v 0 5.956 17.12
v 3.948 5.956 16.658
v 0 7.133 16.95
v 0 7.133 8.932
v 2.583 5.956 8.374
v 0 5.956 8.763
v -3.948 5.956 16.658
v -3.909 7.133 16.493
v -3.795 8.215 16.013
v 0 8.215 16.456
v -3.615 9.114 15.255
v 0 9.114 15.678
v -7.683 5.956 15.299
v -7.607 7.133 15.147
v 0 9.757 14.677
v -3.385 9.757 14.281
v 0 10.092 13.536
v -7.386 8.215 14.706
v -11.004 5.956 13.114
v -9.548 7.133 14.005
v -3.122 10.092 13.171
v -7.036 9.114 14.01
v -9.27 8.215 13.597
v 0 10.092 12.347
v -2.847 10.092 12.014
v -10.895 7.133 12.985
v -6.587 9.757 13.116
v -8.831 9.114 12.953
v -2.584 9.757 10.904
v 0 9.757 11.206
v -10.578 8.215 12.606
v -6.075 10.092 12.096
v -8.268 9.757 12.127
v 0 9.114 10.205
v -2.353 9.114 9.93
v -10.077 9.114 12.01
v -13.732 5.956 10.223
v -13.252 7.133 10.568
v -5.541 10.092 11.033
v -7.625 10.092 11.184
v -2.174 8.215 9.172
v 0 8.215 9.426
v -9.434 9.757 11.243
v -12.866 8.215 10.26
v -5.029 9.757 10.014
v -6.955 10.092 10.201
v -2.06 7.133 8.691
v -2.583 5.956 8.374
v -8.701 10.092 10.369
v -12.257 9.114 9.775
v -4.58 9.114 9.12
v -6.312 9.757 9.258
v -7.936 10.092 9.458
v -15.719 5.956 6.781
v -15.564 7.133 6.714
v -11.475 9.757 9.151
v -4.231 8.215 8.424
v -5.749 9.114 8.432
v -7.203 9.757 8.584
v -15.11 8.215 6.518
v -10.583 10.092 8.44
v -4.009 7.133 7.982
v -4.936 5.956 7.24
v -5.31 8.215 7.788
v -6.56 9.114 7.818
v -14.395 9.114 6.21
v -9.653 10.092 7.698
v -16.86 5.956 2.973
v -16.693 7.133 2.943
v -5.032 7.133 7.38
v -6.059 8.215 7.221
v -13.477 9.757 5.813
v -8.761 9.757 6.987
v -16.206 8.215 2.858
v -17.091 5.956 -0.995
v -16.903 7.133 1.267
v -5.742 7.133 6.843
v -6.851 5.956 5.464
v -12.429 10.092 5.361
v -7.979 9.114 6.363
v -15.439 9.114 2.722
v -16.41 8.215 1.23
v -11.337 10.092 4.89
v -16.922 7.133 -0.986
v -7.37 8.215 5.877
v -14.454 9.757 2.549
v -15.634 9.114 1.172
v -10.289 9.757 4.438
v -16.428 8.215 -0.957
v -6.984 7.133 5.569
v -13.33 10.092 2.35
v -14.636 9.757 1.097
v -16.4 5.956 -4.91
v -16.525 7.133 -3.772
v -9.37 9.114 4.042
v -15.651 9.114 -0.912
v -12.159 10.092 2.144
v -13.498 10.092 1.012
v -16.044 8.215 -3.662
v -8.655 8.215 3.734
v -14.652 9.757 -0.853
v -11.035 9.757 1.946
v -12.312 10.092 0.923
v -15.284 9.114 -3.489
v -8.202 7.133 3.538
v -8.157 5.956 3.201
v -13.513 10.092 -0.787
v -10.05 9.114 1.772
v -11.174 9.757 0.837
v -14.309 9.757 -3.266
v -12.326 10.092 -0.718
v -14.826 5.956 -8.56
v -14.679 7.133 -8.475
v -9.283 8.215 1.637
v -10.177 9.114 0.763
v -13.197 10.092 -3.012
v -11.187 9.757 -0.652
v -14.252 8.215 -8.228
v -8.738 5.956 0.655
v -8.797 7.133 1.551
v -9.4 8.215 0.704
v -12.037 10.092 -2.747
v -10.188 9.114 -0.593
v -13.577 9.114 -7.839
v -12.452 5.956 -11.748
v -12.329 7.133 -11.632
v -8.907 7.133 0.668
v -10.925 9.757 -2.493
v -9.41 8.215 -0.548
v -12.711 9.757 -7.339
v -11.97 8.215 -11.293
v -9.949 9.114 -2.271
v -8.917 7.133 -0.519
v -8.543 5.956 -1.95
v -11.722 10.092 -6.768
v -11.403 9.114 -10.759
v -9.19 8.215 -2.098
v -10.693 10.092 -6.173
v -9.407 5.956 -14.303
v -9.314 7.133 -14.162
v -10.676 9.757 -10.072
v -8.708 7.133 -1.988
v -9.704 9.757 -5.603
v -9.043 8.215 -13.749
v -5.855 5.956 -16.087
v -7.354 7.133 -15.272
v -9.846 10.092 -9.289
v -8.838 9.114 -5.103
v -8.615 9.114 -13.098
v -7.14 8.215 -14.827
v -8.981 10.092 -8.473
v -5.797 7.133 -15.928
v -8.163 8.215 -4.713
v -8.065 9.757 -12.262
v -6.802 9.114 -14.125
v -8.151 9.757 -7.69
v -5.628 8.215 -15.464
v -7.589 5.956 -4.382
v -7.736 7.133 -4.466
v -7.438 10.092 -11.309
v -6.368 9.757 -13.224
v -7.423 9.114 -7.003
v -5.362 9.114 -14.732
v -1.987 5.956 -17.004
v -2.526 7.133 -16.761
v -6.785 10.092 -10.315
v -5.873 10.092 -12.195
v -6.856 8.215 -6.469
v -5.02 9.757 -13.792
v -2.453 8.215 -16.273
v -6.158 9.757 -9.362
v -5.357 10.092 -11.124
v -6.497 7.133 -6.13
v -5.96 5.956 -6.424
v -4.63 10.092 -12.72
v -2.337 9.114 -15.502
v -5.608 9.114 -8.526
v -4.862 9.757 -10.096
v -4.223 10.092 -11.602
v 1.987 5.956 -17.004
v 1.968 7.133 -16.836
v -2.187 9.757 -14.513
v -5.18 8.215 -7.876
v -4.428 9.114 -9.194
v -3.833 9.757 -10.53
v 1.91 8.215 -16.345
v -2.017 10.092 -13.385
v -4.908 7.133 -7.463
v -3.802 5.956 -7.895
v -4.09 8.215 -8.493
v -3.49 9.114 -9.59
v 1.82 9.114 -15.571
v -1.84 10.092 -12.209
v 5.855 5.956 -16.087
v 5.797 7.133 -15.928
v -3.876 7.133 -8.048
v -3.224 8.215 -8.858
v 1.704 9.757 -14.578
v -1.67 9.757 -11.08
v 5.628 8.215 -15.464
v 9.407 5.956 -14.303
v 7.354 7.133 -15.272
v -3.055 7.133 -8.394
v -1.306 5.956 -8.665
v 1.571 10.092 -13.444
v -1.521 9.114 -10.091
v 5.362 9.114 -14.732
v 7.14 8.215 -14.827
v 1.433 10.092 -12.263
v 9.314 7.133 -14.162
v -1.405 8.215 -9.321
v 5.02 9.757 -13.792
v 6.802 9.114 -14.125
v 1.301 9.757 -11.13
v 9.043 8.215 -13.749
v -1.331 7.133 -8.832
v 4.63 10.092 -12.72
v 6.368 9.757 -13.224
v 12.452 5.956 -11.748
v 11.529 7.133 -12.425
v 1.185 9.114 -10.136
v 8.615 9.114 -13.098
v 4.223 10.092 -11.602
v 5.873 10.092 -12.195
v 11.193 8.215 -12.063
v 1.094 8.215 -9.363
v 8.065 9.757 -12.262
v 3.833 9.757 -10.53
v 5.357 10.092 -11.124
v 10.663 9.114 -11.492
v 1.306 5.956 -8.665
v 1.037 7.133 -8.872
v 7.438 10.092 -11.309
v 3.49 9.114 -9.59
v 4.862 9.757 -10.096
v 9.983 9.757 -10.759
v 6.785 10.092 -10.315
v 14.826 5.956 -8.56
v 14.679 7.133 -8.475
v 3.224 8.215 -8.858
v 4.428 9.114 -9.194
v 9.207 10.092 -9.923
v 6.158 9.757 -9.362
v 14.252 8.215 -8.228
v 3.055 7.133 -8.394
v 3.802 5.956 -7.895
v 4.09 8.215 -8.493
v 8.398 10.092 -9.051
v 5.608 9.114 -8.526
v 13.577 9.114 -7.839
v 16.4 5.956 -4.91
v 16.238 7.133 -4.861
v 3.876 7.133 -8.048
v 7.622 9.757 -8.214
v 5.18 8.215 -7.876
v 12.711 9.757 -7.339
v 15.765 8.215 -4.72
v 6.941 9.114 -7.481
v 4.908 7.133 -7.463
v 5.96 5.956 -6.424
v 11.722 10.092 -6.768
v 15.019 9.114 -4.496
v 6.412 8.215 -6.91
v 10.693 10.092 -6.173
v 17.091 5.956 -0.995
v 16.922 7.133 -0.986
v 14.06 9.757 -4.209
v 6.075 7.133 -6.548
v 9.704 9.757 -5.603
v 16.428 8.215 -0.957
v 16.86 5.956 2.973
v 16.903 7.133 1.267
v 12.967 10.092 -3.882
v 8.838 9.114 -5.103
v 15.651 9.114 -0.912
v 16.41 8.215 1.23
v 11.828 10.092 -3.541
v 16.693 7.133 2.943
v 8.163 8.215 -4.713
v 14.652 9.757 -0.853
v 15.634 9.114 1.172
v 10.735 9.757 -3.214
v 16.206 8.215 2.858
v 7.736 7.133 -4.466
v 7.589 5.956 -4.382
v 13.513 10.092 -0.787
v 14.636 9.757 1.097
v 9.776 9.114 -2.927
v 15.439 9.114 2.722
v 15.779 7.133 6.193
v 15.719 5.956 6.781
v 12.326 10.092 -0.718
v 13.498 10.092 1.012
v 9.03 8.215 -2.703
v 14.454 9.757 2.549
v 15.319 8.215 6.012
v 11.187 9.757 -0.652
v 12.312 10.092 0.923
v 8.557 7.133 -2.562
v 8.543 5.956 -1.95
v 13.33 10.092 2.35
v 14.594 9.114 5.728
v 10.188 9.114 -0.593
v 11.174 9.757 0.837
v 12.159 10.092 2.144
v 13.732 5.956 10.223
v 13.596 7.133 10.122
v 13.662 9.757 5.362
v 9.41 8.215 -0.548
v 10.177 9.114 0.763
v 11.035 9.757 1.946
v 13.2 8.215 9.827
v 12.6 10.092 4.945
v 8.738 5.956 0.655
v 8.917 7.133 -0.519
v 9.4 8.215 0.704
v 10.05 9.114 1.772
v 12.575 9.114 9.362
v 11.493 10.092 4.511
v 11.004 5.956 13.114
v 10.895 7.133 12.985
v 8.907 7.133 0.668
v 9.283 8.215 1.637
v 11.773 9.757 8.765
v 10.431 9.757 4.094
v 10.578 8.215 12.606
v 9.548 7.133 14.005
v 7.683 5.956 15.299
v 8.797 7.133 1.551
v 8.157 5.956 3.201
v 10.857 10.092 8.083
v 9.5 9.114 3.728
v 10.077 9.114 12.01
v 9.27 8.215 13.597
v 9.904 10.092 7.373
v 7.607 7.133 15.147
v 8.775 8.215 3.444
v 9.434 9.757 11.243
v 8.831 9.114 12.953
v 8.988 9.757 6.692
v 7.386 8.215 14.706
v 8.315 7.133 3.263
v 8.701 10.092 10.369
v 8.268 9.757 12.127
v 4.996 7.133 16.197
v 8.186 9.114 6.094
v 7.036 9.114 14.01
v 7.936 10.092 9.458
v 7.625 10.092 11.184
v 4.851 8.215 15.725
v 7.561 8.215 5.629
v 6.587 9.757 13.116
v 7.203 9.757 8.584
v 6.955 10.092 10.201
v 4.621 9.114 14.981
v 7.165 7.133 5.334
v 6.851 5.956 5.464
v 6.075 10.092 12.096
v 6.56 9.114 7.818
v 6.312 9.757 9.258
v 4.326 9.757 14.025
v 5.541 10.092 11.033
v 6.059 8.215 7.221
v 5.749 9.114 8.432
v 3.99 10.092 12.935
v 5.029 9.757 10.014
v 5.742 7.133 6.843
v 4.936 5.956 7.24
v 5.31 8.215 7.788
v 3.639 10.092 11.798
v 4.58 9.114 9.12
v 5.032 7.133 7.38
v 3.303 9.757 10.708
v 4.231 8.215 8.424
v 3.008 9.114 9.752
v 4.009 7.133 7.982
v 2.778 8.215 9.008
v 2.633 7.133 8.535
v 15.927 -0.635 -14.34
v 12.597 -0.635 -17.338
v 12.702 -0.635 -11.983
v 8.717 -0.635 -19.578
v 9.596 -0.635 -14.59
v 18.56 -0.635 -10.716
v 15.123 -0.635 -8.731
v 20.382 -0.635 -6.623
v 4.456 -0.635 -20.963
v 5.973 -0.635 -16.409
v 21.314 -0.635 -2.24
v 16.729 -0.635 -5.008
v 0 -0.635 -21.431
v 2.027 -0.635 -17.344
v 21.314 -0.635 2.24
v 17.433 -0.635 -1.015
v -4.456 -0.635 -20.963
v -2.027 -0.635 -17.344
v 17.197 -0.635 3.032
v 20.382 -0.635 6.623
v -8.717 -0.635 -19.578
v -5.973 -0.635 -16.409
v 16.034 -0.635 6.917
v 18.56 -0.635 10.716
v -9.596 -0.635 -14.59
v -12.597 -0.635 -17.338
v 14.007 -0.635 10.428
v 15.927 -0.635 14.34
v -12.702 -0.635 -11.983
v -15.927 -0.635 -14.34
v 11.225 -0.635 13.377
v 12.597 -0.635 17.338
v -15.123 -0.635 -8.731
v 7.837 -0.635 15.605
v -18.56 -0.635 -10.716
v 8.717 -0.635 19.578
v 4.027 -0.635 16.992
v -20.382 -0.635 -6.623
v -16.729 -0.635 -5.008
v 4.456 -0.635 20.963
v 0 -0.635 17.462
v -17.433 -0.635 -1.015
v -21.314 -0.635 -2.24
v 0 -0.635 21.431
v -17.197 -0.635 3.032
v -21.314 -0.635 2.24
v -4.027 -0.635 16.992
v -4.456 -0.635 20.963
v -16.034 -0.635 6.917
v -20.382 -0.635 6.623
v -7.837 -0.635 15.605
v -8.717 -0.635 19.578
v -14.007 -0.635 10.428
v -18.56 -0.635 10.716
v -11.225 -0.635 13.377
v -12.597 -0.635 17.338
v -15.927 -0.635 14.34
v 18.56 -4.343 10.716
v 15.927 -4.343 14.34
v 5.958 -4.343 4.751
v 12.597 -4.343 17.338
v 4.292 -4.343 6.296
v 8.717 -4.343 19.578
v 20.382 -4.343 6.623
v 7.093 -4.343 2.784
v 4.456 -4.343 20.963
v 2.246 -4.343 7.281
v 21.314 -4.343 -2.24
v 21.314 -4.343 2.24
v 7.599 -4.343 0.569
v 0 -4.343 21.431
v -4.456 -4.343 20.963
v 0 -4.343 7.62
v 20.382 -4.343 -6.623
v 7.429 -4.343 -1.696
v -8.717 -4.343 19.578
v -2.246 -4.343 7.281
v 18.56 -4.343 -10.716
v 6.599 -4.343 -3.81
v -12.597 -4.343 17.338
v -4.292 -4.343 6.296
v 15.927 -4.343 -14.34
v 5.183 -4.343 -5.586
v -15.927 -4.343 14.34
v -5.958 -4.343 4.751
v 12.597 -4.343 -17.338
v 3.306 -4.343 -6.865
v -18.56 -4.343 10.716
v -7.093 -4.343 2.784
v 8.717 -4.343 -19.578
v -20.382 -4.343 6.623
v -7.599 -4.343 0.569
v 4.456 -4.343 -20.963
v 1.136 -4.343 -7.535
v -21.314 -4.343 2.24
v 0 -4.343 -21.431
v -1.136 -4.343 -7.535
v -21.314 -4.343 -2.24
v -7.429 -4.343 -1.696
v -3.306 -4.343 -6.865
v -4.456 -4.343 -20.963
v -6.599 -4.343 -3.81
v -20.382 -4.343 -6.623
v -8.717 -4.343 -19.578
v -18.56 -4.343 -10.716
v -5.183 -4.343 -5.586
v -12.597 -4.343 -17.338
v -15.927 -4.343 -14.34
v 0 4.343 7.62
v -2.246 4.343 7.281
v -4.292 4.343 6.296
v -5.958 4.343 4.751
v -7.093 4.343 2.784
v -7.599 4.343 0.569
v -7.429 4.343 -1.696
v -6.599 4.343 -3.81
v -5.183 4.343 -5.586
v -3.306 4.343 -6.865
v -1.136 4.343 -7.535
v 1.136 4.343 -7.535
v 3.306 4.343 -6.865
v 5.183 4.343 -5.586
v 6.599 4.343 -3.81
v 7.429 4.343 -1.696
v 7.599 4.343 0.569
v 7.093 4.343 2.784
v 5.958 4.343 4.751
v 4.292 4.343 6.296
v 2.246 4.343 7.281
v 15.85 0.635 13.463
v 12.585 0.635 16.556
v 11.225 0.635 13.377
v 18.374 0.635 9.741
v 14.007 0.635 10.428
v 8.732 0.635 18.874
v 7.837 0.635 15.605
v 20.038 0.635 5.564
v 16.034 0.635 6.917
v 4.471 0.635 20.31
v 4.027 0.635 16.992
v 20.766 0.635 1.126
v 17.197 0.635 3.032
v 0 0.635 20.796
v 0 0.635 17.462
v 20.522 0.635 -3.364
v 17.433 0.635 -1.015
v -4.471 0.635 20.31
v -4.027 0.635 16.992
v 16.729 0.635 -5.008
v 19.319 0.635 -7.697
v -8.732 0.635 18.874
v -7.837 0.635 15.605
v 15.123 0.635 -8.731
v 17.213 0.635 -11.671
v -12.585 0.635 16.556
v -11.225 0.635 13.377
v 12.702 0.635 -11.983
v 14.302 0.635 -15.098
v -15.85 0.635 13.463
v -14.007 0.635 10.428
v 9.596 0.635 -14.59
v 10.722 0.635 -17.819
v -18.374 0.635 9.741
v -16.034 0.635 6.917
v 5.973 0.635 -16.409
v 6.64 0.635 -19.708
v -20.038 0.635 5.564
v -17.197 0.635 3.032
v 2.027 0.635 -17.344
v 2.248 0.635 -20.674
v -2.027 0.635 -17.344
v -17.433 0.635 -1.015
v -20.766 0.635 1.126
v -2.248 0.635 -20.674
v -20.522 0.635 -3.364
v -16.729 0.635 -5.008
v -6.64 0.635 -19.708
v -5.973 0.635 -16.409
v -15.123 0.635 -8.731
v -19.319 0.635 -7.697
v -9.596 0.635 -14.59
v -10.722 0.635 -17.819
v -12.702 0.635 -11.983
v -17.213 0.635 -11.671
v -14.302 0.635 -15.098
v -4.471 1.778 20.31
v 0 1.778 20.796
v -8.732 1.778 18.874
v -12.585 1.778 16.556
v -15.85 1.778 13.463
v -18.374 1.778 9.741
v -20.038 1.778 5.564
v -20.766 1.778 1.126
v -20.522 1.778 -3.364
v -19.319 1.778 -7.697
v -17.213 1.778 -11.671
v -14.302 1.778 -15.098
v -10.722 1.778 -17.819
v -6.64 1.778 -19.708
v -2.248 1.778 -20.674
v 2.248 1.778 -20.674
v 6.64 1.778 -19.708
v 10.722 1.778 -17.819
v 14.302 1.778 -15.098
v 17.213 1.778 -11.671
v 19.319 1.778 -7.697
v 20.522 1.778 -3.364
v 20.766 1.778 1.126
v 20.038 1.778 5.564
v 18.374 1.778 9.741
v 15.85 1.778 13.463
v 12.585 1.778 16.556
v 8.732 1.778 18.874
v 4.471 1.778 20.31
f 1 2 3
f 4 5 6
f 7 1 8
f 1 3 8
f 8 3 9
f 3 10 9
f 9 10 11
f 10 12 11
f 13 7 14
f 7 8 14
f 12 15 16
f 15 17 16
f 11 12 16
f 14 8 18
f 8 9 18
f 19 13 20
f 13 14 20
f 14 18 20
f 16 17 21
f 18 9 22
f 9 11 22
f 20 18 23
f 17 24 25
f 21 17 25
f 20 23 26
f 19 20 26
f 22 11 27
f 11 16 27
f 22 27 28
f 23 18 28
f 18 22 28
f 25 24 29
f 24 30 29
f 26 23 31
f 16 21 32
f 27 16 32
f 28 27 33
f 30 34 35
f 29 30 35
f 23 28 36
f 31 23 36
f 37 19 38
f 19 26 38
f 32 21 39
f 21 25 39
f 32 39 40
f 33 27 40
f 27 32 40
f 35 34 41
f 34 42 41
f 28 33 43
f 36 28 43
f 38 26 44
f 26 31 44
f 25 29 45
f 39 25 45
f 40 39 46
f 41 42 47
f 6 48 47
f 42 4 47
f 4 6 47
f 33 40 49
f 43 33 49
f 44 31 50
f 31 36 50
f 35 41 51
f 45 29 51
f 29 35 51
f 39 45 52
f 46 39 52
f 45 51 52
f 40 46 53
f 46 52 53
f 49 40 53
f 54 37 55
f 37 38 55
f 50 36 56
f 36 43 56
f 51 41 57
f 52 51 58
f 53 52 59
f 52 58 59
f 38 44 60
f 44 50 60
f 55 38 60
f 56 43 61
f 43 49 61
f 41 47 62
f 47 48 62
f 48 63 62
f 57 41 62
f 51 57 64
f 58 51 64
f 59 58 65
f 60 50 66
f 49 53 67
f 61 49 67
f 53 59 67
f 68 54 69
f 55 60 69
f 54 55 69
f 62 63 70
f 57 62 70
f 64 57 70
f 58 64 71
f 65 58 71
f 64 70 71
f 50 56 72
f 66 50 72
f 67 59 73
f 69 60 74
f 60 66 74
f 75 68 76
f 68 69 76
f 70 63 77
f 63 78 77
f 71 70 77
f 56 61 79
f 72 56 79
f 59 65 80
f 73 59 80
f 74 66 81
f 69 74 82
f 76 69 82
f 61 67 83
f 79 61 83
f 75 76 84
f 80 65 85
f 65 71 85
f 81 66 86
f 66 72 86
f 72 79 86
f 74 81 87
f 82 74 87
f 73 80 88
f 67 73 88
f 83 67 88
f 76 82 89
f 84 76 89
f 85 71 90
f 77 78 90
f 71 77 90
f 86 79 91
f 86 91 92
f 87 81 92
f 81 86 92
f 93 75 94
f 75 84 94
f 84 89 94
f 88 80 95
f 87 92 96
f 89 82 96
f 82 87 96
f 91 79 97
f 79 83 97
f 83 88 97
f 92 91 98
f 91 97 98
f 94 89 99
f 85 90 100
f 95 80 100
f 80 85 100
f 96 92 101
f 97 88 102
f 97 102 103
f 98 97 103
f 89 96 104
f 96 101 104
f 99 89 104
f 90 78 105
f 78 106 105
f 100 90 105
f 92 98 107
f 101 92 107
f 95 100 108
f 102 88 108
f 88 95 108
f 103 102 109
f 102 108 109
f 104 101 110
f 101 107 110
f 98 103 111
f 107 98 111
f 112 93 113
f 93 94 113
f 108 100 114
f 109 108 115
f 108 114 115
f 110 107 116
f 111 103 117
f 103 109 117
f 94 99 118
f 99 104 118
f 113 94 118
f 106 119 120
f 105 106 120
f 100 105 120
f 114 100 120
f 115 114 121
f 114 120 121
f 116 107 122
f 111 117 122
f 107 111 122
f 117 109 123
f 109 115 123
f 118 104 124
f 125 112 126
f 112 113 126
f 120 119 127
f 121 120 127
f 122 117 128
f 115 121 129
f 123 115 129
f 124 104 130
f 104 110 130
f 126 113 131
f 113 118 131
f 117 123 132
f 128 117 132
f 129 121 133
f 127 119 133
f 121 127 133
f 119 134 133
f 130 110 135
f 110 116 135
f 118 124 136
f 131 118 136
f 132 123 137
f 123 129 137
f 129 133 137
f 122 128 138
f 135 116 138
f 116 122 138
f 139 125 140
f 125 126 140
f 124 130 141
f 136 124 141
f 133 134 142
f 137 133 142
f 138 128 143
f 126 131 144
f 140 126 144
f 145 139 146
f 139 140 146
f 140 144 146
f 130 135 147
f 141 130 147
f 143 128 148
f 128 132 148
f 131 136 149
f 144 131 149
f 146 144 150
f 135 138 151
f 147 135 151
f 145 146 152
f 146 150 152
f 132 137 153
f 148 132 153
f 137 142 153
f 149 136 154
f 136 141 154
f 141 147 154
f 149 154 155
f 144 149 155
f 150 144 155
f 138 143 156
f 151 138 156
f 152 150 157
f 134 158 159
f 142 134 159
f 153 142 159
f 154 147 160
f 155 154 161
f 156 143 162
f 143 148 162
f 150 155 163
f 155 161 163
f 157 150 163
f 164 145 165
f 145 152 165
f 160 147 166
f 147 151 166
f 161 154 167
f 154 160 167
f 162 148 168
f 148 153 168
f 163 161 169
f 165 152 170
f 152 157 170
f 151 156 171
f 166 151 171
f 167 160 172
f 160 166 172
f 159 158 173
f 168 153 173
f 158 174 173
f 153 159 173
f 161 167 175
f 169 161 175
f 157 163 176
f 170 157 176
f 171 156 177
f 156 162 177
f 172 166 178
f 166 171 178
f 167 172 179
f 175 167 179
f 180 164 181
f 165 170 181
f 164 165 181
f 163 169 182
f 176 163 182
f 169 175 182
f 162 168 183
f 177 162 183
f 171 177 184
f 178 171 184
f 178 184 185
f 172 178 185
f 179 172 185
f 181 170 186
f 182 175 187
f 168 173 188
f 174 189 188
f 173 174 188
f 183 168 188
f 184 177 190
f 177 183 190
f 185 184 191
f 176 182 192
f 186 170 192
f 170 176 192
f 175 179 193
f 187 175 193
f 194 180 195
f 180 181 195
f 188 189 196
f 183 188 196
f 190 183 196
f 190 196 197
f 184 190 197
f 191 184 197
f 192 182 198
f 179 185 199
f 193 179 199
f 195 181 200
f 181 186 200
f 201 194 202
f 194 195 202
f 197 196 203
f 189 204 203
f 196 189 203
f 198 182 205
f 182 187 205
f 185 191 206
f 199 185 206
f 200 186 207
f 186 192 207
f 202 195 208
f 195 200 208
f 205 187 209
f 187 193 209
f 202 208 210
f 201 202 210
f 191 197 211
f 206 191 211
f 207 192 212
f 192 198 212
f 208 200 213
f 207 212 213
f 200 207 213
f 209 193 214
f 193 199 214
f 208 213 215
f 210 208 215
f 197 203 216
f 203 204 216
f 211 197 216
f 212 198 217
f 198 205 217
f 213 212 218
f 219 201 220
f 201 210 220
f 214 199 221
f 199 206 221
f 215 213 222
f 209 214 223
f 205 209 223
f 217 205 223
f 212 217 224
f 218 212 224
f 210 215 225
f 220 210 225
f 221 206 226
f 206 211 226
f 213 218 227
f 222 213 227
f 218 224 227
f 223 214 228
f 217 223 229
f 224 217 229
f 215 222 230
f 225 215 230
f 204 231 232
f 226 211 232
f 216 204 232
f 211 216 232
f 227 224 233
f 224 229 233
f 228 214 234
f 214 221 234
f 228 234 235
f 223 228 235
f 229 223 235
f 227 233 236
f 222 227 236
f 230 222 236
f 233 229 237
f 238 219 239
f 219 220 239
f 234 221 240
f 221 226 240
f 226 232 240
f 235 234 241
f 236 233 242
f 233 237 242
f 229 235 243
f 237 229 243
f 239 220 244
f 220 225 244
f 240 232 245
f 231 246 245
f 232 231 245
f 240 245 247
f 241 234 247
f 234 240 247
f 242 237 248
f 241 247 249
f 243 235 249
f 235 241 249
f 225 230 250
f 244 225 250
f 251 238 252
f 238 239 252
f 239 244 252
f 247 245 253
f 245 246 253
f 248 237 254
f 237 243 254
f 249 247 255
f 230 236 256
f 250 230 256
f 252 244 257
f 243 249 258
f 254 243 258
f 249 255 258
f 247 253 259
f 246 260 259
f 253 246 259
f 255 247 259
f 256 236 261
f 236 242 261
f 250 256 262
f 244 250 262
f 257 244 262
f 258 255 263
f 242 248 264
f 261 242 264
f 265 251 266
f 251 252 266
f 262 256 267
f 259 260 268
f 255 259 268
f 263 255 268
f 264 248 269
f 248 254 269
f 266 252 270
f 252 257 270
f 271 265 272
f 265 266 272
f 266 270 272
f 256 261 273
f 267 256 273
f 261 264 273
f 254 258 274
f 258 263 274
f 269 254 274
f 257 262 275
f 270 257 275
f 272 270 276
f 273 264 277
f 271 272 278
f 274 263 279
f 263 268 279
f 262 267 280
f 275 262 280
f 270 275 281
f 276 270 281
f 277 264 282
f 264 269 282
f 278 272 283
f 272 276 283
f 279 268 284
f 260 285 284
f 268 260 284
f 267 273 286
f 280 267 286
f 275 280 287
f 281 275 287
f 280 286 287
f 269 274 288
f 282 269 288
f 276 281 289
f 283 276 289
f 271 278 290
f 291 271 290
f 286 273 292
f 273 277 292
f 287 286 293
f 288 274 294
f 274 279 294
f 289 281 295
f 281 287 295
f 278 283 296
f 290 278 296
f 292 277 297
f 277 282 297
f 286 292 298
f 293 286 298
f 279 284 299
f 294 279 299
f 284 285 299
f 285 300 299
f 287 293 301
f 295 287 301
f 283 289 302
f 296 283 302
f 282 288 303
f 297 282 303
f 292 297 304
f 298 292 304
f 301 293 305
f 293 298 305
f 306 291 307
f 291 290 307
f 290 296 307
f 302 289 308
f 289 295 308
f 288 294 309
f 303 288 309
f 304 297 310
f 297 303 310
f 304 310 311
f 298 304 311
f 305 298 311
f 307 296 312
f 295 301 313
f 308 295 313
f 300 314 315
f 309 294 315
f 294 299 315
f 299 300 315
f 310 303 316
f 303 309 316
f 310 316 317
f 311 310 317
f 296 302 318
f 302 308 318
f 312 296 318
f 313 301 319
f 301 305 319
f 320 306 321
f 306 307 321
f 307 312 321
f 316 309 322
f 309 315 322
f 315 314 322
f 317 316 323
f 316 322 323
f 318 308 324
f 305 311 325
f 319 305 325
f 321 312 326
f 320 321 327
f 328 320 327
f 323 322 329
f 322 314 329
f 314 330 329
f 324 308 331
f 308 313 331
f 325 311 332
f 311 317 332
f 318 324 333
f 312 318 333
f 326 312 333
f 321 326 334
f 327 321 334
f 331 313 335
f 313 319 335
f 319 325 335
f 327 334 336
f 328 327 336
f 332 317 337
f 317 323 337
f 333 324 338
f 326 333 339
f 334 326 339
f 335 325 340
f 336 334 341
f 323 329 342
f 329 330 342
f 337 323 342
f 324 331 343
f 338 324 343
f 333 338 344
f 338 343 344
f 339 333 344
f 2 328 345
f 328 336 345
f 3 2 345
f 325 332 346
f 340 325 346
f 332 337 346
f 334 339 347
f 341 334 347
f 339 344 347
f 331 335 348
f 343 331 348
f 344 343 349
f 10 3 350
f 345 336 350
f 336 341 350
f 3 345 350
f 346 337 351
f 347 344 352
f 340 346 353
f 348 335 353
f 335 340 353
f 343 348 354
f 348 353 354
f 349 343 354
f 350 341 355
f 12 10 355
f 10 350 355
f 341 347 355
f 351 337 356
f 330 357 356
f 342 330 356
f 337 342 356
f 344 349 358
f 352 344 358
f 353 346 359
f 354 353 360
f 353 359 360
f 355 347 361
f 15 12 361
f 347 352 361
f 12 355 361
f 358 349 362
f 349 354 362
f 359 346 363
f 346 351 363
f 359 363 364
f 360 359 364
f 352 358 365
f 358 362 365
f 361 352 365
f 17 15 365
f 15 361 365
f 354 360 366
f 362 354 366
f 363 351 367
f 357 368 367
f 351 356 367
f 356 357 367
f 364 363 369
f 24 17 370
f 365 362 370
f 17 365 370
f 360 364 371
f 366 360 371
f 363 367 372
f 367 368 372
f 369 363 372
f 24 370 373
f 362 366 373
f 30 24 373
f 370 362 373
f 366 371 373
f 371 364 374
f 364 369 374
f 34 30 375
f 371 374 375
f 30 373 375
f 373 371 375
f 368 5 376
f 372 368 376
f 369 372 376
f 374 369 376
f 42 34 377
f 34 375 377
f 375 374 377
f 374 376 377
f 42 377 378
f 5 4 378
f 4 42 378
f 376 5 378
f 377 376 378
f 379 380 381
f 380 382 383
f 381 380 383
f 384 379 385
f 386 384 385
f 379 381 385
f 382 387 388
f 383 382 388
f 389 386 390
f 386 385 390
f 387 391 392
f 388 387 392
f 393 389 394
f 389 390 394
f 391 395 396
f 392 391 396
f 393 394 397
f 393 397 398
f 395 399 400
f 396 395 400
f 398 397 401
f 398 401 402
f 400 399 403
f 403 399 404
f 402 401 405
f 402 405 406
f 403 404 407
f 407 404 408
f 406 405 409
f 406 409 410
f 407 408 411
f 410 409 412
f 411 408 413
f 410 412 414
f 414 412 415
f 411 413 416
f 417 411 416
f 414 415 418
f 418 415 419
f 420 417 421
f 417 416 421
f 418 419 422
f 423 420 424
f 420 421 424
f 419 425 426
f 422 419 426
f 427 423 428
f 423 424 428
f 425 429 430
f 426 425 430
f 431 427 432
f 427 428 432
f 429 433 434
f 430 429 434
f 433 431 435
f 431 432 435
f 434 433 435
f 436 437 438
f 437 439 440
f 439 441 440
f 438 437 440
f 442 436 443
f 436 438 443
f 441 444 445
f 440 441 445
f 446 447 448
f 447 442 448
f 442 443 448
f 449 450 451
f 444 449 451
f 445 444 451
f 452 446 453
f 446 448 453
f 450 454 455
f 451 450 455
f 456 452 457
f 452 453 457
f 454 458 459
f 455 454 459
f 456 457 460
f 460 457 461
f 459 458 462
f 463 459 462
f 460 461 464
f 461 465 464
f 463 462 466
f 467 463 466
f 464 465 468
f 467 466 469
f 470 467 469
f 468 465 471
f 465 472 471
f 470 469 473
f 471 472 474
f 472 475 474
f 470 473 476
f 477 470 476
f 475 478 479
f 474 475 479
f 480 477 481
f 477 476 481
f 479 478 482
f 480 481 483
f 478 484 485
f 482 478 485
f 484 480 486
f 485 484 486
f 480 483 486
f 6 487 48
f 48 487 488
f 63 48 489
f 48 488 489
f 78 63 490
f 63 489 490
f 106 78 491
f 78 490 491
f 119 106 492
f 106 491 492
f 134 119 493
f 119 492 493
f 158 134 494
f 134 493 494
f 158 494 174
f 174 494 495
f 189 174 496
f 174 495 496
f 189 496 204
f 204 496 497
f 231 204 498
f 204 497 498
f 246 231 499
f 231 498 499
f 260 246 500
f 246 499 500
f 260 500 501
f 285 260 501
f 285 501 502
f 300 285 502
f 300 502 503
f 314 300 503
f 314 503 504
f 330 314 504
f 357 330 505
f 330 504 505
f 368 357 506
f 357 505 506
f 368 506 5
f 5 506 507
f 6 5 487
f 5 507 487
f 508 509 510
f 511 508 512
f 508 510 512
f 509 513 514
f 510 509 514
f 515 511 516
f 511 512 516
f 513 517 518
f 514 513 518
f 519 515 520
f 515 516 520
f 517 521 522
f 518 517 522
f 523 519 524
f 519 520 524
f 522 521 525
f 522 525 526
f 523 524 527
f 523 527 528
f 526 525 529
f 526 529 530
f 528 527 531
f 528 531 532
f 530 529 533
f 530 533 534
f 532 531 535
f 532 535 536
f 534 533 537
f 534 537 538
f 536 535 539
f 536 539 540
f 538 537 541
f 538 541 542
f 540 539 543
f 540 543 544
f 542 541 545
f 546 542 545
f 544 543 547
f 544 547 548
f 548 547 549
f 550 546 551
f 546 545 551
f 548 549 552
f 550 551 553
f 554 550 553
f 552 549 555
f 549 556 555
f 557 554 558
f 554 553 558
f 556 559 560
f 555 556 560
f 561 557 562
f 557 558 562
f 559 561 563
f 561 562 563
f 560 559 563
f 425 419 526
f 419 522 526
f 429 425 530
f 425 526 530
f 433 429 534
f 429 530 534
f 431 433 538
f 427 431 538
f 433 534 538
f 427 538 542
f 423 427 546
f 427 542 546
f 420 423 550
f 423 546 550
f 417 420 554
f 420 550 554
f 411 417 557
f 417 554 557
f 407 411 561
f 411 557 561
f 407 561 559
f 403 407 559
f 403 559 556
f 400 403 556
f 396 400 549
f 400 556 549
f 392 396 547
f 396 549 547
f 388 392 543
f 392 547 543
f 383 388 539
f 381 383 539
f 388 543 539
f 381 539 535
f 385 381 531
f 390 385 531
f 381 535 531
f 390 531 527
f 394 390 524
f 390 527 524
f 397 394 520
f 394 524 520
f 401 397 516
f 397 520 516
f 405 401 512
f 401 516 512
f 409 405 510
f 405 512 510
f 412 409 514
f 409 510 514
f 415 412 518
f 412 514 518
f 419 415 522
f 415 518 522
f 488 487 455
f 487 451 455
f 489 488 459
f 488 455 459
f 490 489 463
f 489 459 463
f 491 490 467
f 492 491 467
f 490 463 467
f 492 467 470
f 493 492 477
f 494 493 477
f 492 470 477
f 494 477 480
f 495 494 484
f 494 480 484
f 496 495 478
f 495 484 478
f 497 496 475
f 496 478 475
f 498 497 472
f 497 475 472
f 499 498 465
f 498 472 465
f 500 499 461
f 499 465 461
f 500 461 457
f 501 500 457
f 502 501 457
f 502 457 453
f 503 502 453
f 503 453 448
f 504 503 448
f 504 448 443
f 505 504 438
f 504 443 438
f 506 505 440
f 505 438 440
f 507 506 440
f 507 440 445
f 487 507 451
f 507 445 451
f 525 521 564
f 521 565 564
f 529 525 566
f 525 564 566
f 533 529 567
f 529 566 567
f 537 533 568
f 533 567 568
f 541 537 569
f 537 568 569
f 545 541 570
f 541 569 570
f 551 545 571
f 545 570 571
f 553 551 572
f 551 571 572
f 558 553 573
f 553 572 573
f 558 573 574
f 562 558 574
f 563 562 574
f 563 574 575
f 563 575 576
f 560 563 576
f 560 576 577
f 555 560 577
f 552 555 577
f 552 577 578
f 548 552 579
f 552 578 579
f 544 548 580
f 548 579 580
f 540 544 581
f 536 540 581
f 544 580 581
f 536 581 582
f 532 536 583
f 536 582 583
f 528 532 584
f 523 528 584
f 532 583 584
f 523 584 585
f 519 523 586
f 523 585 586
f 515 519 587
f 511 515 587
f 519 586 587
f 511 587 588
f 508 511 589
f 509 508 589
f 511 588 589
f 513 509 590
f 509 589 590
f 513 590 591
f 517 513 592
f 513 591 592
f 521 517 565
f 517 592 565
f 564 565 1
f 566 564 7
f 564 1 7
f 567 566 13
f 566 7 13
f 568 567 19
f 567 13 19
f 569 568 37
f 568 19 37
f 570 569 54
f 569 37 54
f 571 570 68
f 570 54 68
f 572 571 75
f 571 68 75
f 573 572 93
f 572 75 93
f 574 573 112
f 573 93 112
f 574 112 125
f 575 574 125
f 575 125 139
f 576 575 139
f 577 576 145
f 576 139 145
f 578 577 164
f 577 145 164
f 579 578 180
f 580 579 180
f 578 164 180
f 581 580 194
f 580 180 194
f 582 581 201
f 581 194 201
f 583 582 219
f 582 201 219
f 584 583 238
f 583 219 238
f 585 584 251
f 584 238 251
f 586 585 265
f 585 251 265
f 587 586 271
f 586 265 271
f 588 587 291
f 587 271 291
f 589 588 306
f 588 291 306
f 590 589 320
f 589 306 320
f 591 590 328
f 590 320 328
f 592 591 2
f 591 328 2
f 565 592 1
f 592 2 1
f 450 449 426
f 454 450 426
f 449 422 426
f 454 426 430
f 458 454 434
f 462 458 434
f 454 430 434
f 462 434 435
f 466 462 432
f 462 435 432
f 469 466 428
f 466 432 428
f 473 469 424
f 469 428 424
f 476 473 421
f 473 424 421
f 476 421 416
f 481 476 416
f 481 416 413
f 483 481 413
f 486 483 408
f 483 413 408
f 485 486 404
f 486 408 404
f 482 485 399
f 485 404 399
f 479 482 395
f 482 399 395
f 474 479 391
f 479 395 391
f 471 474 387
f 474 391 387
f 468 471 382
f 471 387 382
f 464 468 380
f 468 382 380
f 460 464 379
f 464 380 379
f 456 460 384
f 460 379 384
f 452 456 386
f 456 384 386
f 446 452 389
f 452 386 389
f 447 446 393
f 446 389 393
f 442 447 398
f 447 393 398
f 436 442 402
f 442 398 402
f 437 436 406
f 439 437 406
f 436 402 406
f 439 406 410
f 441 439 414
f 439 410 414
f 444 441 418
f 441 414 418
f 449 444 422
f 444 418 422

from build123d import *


with BuildPart() as part:
    # Sketch1 → Revolve1 (revolve)
    with BuildSketch(Plane.XY, mode=Mode.PRIVATE) as revolve1_sk:
        with BuildLine():
            Line((8.763, 5.9563), (7.62, 4.3434))
            Line((7.62, 4.3434), (7.62, -4.3434))
            Line((7.62, -4.3434), (21.43125, -4.3434))
            Line((21.43125, -4.3434), (21.43125, -0.635))
            Line((21.43125, -0.635), (17.4625, -0.635))
            Line((17.4625, -0.635), (17.4625, 0.635))
            Line((17.4625, 0.635), (20.79625, 0.635))
            Line((20.79625, 0.635), (20.79625, 1.778))
            Line((20.79625, 1.778), (17.1196, 5.9563))
            ThreePointArc((17.1196, 5.9563), (12.9413, 10.1346), (8.763, 5.9563))
        make_face()
    revolve(revolve1_sk.sketch.rotate(Axis((0, 10.1346, 0), (0, -1, 0)), 90), axis=Axis((0, 10.1346, 0), (0, -1, 0)))


solid = part.part
